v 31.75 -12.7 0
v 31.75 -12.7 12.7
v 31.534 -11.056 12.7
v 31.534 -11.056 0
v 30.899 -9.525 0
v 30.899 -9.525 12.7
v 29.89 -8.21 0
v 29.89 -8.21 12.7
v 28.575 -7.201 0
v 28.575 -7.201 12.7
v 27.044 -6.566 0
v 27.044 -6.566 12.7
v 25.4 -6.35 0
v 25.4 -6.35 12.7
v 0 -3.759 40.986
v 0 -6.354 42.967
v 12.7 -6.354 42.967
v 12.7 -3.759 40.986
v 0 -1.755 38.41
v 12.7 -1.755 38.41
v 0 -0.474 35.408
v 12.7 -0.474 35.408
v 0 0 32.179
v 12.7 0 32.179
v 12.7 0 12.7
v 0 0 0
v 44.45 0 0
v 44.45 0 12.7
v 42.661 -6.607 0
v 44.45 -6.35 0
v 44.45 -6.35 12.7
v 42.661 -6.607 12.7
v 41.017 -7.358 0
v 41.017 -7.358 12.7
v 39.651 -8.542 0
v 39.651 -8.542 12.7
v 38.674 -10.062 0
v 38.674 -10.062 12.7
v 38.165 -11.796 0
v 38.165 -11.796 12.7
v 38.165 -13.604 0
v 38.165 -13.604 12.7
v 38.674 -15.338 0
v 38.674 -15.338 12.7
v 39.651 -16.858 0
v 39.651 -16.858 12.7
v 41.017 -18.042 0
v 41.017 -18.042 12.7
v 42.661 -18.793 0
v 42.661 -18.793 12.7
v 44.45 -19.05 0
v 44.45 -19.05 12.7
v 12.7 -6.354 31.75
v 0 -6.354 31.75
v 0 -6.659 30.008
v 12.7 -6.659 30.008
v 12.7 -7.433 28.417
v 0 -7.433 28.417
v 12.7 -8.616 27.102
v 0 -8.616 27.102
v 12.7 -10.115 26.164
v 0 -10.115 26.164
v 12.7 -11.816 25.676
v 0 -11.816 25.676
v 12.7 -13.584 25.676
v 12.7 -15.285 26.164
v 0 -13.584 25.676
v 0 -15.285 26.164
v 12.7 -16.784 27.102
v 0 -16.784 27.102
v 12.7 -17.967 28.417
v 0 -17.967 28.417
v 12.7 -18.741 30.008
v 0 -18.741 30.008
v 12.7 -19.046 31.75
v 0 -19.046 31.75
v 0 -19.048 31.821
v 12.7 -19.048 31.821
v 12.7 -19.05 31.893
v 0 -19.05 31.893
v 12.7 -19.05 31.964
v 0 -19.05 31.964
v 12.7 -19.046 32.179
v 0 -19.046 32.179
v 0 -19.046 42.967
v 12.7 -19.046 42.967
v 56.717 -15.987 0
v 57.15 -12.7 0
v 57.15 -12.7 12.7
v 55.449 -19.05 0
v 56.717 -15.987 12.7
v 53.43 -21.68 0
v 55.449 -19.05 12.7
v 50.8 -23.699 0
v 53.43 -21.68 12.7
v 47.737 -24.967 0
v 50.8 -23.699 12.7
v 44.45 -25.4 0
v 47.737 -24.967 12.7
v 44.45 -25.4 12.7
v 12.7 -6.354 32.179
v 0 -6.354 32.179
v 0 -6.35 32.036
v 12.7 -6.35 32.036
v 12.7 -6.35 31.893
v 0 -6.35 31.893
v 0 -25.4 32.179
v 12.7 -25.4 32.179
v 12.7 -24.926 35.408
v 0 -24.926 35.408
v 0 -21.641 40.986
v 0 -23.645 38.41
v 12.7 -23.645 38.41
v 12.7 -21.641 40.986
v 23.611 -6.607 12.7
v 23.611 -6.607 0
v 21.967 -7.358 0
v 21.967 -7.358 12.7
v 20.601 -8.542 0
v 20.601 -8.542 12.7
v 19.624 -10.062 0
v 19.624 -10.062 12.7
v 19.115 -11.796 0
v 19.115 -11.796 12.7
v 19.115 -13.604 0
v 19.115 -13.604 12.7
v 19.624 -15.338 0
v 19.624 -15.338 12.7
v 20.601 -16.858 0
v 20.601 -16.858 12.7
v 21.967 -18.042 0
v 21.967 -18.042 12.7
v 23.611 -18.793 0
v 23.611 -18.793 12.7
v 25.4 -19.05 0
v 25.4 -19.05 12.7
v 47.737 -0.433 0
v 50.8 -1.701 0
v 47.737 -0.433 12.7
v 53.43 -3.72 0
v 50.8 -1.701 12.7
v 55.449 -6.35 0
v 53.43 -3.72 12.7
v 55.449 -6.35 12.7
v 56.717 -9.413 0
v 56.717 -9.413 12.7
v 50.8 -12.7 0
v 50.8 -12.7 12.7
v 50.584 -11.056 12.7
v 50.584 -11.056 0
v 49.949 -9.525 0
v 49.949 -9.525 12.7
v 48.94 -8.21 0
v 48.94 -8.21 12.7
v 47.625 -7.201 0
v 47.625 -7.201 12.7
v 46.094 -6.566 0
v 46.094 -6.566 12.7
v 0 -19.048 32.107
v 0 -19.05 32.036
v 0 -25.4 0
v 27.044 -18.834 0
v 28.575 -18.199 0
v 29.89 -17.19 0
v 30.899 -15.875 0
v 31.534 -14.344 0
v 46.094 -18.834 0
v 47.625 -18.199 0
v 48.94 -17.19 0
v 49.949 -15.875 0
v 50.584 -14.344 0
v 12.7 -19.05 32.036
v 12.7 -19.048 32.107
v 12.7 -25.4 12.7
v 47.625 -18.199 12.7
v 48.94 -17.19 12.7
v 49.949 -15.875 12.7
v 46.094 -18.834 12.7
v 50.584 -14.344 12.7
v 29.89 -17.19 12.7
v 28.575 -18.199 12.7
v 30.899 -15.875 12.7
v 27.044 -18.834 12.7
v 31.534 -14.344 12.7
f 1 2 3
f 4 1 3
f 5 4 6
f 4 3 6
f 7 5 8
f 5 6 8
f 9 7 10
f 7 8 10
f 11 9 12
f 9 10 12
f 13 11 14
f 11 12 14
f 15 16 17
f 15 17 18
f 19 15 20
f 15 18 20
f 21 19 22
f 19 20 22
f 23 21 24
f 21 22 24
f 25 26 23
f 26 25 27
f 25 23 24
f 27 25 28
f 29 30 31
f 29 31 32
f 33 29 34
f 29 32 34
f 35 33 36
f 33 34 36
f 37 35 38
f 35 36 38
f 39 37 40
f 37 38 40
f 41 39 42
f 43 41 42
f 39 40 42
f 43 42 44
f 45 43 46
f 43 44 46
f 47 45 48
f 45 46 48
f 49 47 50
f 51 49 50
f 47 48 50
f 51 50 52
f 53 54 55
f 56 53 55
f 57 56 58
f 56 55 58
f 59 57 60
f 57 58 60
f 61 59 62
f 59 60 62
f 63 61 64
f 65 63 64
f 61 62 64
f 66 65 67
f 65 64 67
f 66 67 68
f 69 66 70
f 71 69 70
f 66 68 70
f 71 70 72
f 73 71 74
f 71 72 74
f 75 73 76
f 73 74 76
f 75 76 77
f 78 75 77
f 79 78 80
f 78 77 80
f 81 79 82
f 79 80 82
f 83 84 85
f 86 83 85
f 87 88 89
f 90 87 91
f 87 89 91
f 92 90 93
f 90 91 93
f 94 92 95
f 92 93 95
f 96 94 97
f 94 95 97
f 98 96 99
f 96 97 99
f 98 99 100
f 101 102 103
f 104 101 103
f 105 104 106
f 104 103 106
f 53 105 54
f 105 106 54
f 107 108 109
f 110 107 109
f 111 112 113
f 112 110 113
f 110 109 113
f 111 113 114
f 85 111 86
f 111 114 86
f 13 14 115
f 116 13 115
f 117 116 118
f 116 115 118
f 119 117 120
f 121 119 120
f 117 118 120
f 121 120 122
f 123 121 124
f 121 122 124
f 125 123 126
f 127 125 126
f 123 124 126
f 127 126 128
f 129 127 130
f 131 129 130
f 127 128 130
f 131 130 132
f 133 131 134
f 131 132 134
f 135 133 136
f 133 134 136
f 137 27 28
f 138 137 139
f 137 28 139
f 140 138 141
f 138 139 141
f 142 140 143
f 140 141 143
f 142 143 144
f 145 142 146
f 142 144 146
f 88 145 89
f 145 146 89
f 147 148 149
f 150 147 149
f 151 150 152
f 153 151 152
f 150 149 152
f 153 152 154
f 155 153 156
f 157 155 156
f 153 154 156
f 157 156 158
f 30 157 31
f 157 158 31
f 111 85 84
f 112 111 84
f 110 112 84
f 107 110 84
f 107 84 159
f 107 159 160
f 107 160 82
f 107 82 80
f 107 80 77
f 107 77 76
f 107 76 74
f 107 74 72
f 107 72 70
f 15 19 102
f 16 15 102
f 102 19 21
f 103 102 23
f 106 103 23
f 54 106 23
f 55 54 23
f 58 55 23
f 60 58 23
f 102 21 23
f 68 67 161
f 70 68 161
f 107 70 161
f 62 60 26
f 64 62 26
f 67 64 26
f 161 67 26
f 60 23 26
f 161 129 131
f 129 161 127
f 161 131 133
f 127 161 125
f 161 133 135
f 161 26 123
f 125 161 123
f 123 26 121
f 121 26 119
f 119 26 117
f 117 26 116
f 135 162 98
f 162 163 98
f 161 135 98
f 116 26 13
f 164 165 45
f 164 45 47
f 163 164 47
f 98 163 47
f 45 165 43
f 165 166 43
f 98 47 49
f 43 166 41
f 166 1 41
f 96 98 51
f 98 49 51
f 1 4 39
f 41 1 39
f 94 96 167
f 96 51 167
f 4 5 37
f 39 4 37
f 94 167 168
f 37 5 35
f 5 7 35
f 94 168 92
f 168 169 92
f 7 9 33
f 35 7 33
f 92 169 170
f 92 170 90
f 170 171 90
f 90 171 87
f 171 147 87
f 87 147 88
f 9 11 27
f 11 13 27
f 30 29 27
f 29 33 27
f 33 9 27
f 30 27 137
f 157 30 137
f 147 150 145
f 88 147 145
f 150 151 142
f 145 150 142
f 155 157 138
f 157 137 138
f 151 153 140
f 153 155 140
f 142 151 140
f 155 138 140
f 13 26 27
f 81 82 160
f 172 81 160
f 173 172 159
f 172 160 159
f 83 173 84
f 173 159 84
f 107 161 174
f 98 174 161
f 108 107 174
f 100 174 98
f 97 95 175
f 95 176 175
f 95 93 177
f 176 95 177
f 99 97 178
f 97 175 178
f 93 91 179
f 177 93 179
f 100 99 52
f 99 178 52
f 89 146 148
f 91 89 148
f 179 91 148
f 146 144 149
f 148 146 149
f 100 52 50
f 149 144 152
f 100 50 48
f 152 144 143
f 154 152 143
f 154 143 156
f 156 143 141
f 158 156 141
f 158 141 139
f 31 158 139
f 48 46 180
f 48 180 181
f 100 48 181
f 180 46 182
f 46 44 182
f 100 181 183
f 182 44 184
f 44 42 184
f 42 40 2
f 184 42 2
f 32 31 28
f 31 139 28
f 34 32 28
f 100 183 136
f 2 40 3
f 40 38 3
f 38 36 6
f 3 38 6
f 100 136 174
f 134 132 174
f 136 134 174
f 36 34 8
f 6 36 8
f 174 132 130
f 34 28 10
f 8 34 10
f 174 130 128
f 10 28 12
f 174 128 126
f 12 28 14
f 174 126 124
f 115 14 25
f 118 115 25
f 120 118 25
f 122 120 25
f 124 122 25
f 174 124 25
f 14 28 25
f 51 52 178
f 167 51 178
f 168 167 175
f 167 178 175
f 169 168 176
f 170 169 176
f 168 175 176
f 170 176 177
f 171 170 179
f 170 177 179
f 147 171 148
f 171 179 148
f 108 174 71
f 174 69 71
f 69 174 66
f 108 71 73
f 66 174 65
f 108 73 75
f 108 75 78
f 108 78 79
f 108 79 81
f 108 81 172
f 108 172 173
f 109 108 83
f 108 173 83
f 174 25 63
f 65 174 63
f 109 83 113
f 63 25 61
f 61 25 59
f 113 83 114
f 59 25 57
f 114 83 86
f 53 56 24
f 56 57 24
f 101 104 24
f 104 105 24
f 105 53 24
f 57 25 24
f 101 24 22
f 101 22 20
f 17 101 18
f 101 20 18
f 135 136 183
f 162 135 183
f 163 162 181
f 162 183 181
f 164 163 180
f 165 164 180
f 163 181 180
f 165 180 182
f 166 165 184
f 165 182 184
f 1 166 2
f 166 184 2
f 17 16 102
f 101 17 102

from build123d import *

# Parameters (mm, degrees)
F1_DEPTH = 25.4
F3_DEPTH = 12.701
F5_DEPTH = 12.701
F7_DEPTH = 57.151


with BuildPart() as f1:
    # F0 (on Front) → F1 (new body)
    with BuildSketch(Plane.XZ):
        Polygon((0, 44.45), (0, 0), (57.15, 0), (57.15, 12.7), (12.7, 12.7), (12.7, 44.45), align=None)
    extrude(amount=F1_DEPTH)

    # F2 (on face) → F3 (cut, through all)
    with BuildSketch(Plane.XY.offset(12.7)):
        with BuildLine():
            Line((25.4, -19.05), (25.4, -6.35))
            ThreePointArc((25.4, -6.35), (19.05, -12.7), (25.4, -19.05))
        make_face()
        with BuildLine():
            ThreePointArc((31.75, -12.7), (29.8901280605, -8.2098719395), (25.4, -6.35))
            Line((25.4, -6.35), (25.4, -19.05))
            ThreePointArc((25.4, -19.05), (29.8901280605, -17.1901280605), (31.75, -12.7))
        make_face()
        with BuildLine():
            Line((44.45, -19.05), (44.45, -6.35))
            ThreePointArc((44.45, -6.35), (38.1, -12.7), (44.45, -19.05))
        make_face()
        with BuildLine():
            ThreePointArc((50.8, -12.7), (48.9401280605, -8.2098719395), (44.45, -6.35))
            Line((44.45, -6.35), (44.45, -19.05))
            ThreePointArc((44.45, -19.05), (48.9401280605, -17.1901280605), (50.8, -12.7))
        make_face()
        with BuildLine():
            Line((57.15, 0), (44.45, 0))
            ThreePointArc((44.45, 0), (53.4302561211, -3.7197438789), (57.15, -12.7))
            Line((57.15, -12.7), (57.15, 0))
        make_face()
        with BuildLine():
            Line((57.15, -25.4), (57.15, -12.7))
            ThreePointArc((57.15, -12.7), (53.4302561211, -21.6802561211), (44.45, -25.4))
            Line((44.45, -25.4), (57.15, -25.4))
        make_face()
    extrude(amount=-F3_DEPTH, mode=Mode.SUBTRACT)

    # F4 (on face) → F5 (cut, through all)
    with BuildSketch(Plane.YZ.offset(12.7)):
        with BuildLine():
            ThreePointArc((-25.4, 32.1787146746), (-25.4018088896, 31.9643573373), (-25.4, 31.75))
            Line((-25.4, 31.75), (-25.4, 32.1787146746))
        make_face()
        with BuildLine():
            Line((0, 32.1787146746), (0, 31.75))
            ThreePointArc((0, 31.75), (0.0018088896, 31.9643573373), (0, 32.1787146746))
        make_face()
        with BuildLine():
            Line((-25.4, 44.45), (-25.4, 32.1787146746))
            ThreePointArc((-25.4, 32.1787146746), (-22.4029254465, 40.1612583888), (-15.0333830306, 44.45))
            Line((-15.0333830306, 44.45), (-25.4, 44.45))
        make_face()
        with BuildLine():
            ThreePointArc((-10.3666169694, 44.45), (-2.9970745535, 40.1612583888), (0, 32.1787146746))
            Line((0, 32.1787146746), (0, 44.45))
            Line((0, 44.45), (-10.3666169694, 44.45))
        make_face()
    extrude(amount=-F5_DEPTH, mode=Mode.SUBTRACT)

    # F6 (on face) → F7 (cut, through all)
    with BuildSketch(Plane(origin=(0, 0, 0), x_dir=(0, -1, 0), z_dir=(-1, 0, 0))):
        with BuildLine():
            Line((6.3536190682, 32.1787146746), (6.3536190682, 31.75))
            Line((6.3536190682, 31.75), (19.0463809318, 31.75))
            Line((19.0463809318, 31.75), (19.0463809318, 32.1787146746))
            ThreePointArc((19.0463809318, 32.1787146746), (12.7, 38.3143573373), (6.3536190682, 32.1787146746))
        make_face()
        with BuildLine():
            Line((19.0463809318, 31.75), (6.3536190682, 31.75))
            ThreePointArc((6.3536190682, 31.75), (12.7, 25.6143573373), (19.0463809318, 31.75))
        make_face()
        with BuildLine():
            ThreePointArc((6.3536190682, 32.1787146746), (6.35, 31.9643573373), (6.3536190682, 31.75))
            Line((6.3536190682, 31.75), (6.3536190682, 32.1787146746))
        make_face()
        with BuildLine():
            Line((19.0463809318, 32.1787146746), (19.0463809318, 31.75))
            ThreePointArc((19.0463809318, 31.75), (19.0490951685, 31.8571633942), (19.05, 31.9643573373))
            ThreePointArc((19.05, 31.9643573373), (19.0490951685, 32.0715512803), (19.0463809318, 32.1787146746))
        make_face()
        with BuildLine():
            Line((6.3536190682, 42.9670569213), (6.3536190682, 32.1787146746))
            ThreePointArc((6.3536190682, 32.1787146746), (12.7, 38.3143573373), (19.0463809318, 32.1787146746))
            Line((19.0463809318, 32.1787146746), (19.0463809318, 42.9670569213))
            ThreePointArc((19.0463809318, 42.9670569213), (17.1027668181, 43.8787013567), (15.0333830306, 44.45))
            Line((15.0333830306, 44.45), (10.3666169694, 44.45))
            ThreePointArc((10.3666169694, 44.45), (8.2972331819, 43.8787013567), (6.3536190682, 42.9670569213))
        make_face()
    extrude(amount=-F7_DEPTH, mode=Mode.SUBTRACT)


solid = f1.part
